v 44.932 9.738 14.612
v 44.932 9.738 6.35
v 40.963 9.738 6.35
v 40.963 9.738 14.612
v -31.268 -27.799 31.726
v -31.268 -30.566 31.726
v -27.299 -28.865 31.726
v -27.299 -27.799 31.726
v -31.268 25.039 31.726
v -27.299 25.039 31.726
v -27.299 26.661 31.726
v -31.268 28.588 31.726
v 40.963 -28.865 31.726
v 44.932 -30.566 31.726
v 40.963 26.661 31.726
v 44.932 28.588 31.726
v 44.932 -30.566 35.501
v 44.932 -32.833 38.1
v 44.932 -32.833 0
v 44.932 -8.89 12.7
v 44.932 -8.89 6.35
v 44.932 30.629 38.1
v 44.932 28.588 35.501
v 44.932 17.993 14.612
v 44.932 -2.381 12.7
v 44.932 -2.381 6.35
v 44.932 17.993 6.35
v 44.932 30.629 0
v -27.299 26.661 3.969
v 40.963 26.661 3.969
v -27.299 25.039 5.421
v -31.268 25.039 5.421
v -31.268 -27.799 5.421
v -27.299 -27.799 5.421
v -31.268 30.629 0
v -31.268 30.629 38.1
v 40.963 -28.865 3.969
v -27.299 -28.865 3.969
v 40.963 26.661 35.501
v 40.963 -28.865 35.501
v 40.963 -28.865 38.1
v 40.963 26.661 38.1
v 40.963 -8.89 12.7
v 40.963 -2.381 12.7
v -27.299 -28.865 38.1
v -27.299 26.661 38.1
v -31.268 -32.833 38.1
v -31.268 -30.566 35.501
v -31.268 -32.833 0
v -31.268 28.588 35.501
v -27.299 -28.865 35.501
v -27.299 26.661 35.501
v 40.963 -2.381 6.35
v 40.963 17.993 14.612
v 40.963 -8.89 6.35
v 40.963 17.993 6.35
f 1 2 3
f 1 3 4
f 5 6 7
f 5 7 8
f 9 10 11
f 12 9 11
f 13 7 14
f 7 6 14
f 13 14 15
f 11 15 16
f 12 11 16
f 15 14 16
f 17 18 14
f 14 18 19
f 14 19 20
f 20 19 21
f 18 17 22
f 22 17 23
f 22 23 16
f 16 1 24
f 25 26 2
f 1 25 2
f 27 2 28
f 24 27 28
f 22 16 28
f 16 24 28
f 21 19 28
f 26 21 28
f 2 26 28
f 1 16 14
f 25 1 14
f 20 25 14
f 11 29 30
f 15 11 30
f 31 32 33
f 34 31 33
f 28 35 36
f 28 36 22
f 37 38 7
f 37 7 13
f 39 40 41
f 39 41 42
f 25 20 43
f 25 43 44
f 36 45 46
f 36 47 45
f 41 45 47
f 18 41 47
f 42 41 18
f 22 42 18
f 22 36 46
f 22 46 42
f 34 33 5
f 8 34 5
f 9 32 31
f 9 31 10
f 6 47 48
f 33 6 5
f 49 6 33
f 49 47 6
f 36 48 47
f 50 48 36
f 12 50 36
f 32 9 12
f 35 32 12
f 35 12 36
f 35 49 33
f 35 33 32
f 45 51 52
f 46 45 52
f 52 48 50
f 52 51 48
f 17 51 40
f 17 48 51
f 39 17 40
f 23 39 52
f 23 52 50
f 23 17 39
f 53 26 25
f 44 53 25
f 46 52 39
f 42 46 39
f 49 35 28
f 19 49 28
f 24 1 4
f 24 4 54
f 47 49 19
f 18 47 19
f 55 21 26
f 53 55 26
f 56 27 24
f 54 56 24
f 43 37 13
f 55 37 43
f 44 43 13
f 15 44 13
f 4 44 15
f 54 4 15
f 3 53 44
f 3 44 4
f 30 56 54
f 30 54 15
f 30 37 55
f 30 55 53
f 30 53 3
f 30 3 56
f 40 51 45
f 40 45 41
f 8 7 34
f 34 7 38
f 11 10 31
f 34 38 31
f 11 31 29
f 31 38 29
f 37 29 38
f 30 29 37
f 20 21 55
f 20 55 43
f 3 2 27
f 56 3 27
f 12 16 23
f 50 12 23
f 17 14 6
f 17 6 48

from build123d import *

# Parameters (mm, degrees)
F0_W     = 76.2
F0_H     = 63.462952
F1_DEPTH = 38.1
F2_T     = -3.96875
F3_W     = 59.153464
F3_H     = 3.775753
F4_DEPTH = 84.455
F5_W     = 8.255
F5_H     = 8.262471
F5_W_2   = 6.50875
F5_H_2   = 6.35
F6_DEPTH = 6.35
F8_W     = 52.838832
F8_H     = 26.304427
F9_DEPTH = 6.35


with BuildPart() as f1:
    # F0 (on Top) → F1 (new body)
    with BuildSketch(Plane.XY):
        with Locations((6.831993, -1.102022)):
            Rectangle(F0_W, F0_H)
    extrude(amount=F1_DEPTH)

    # F2
    f2_openings = [f1.faces().sort_by_distance(p)[0] for p in [
        (6.831993, -1.102022, 38.1),
    ]]
    offset(amount=F2_T, openings=f2_openings)

    # F3 (on face) → F4 (cut)
    with BuildSketch(Plane.YZ.offset(44.931993)):
        with Locations((-0.988886, 33.613619)):
            Rectangle(F3_W, F3_H)
    extrude(amount=-F4_DEPTH, mode=Mode.SUBTRACT)

    # F5 (on face) → F6 (cut)
    with BuildSketch(Plane.YZ.offset(44.931993)):
        with Locations((13.865454, 10.481236)):
            Rectangle(F5_W, F5_H)
        with Locations((-5.635625, 9.525)):
            Rectangle(F5_W_2, F5_H_2)
    extrude(amount=-F6_DEPTH, mode=Mode.SUBTRACT)

    # F8 (on face) → F9 (cut)
    with BuildSketch(Plane(origin=(-31.268007, 0, 0), x_dir=(0, -1, 0), z_dir=(-1, 0, 0))):
        with Locations((1.379967, 18.573529)):
            Rectangle(F8_W, F8_H)
    extrude(amount=-F9_DEPTH, mode=Mode.SUBTRACT)


solid = f1.part
